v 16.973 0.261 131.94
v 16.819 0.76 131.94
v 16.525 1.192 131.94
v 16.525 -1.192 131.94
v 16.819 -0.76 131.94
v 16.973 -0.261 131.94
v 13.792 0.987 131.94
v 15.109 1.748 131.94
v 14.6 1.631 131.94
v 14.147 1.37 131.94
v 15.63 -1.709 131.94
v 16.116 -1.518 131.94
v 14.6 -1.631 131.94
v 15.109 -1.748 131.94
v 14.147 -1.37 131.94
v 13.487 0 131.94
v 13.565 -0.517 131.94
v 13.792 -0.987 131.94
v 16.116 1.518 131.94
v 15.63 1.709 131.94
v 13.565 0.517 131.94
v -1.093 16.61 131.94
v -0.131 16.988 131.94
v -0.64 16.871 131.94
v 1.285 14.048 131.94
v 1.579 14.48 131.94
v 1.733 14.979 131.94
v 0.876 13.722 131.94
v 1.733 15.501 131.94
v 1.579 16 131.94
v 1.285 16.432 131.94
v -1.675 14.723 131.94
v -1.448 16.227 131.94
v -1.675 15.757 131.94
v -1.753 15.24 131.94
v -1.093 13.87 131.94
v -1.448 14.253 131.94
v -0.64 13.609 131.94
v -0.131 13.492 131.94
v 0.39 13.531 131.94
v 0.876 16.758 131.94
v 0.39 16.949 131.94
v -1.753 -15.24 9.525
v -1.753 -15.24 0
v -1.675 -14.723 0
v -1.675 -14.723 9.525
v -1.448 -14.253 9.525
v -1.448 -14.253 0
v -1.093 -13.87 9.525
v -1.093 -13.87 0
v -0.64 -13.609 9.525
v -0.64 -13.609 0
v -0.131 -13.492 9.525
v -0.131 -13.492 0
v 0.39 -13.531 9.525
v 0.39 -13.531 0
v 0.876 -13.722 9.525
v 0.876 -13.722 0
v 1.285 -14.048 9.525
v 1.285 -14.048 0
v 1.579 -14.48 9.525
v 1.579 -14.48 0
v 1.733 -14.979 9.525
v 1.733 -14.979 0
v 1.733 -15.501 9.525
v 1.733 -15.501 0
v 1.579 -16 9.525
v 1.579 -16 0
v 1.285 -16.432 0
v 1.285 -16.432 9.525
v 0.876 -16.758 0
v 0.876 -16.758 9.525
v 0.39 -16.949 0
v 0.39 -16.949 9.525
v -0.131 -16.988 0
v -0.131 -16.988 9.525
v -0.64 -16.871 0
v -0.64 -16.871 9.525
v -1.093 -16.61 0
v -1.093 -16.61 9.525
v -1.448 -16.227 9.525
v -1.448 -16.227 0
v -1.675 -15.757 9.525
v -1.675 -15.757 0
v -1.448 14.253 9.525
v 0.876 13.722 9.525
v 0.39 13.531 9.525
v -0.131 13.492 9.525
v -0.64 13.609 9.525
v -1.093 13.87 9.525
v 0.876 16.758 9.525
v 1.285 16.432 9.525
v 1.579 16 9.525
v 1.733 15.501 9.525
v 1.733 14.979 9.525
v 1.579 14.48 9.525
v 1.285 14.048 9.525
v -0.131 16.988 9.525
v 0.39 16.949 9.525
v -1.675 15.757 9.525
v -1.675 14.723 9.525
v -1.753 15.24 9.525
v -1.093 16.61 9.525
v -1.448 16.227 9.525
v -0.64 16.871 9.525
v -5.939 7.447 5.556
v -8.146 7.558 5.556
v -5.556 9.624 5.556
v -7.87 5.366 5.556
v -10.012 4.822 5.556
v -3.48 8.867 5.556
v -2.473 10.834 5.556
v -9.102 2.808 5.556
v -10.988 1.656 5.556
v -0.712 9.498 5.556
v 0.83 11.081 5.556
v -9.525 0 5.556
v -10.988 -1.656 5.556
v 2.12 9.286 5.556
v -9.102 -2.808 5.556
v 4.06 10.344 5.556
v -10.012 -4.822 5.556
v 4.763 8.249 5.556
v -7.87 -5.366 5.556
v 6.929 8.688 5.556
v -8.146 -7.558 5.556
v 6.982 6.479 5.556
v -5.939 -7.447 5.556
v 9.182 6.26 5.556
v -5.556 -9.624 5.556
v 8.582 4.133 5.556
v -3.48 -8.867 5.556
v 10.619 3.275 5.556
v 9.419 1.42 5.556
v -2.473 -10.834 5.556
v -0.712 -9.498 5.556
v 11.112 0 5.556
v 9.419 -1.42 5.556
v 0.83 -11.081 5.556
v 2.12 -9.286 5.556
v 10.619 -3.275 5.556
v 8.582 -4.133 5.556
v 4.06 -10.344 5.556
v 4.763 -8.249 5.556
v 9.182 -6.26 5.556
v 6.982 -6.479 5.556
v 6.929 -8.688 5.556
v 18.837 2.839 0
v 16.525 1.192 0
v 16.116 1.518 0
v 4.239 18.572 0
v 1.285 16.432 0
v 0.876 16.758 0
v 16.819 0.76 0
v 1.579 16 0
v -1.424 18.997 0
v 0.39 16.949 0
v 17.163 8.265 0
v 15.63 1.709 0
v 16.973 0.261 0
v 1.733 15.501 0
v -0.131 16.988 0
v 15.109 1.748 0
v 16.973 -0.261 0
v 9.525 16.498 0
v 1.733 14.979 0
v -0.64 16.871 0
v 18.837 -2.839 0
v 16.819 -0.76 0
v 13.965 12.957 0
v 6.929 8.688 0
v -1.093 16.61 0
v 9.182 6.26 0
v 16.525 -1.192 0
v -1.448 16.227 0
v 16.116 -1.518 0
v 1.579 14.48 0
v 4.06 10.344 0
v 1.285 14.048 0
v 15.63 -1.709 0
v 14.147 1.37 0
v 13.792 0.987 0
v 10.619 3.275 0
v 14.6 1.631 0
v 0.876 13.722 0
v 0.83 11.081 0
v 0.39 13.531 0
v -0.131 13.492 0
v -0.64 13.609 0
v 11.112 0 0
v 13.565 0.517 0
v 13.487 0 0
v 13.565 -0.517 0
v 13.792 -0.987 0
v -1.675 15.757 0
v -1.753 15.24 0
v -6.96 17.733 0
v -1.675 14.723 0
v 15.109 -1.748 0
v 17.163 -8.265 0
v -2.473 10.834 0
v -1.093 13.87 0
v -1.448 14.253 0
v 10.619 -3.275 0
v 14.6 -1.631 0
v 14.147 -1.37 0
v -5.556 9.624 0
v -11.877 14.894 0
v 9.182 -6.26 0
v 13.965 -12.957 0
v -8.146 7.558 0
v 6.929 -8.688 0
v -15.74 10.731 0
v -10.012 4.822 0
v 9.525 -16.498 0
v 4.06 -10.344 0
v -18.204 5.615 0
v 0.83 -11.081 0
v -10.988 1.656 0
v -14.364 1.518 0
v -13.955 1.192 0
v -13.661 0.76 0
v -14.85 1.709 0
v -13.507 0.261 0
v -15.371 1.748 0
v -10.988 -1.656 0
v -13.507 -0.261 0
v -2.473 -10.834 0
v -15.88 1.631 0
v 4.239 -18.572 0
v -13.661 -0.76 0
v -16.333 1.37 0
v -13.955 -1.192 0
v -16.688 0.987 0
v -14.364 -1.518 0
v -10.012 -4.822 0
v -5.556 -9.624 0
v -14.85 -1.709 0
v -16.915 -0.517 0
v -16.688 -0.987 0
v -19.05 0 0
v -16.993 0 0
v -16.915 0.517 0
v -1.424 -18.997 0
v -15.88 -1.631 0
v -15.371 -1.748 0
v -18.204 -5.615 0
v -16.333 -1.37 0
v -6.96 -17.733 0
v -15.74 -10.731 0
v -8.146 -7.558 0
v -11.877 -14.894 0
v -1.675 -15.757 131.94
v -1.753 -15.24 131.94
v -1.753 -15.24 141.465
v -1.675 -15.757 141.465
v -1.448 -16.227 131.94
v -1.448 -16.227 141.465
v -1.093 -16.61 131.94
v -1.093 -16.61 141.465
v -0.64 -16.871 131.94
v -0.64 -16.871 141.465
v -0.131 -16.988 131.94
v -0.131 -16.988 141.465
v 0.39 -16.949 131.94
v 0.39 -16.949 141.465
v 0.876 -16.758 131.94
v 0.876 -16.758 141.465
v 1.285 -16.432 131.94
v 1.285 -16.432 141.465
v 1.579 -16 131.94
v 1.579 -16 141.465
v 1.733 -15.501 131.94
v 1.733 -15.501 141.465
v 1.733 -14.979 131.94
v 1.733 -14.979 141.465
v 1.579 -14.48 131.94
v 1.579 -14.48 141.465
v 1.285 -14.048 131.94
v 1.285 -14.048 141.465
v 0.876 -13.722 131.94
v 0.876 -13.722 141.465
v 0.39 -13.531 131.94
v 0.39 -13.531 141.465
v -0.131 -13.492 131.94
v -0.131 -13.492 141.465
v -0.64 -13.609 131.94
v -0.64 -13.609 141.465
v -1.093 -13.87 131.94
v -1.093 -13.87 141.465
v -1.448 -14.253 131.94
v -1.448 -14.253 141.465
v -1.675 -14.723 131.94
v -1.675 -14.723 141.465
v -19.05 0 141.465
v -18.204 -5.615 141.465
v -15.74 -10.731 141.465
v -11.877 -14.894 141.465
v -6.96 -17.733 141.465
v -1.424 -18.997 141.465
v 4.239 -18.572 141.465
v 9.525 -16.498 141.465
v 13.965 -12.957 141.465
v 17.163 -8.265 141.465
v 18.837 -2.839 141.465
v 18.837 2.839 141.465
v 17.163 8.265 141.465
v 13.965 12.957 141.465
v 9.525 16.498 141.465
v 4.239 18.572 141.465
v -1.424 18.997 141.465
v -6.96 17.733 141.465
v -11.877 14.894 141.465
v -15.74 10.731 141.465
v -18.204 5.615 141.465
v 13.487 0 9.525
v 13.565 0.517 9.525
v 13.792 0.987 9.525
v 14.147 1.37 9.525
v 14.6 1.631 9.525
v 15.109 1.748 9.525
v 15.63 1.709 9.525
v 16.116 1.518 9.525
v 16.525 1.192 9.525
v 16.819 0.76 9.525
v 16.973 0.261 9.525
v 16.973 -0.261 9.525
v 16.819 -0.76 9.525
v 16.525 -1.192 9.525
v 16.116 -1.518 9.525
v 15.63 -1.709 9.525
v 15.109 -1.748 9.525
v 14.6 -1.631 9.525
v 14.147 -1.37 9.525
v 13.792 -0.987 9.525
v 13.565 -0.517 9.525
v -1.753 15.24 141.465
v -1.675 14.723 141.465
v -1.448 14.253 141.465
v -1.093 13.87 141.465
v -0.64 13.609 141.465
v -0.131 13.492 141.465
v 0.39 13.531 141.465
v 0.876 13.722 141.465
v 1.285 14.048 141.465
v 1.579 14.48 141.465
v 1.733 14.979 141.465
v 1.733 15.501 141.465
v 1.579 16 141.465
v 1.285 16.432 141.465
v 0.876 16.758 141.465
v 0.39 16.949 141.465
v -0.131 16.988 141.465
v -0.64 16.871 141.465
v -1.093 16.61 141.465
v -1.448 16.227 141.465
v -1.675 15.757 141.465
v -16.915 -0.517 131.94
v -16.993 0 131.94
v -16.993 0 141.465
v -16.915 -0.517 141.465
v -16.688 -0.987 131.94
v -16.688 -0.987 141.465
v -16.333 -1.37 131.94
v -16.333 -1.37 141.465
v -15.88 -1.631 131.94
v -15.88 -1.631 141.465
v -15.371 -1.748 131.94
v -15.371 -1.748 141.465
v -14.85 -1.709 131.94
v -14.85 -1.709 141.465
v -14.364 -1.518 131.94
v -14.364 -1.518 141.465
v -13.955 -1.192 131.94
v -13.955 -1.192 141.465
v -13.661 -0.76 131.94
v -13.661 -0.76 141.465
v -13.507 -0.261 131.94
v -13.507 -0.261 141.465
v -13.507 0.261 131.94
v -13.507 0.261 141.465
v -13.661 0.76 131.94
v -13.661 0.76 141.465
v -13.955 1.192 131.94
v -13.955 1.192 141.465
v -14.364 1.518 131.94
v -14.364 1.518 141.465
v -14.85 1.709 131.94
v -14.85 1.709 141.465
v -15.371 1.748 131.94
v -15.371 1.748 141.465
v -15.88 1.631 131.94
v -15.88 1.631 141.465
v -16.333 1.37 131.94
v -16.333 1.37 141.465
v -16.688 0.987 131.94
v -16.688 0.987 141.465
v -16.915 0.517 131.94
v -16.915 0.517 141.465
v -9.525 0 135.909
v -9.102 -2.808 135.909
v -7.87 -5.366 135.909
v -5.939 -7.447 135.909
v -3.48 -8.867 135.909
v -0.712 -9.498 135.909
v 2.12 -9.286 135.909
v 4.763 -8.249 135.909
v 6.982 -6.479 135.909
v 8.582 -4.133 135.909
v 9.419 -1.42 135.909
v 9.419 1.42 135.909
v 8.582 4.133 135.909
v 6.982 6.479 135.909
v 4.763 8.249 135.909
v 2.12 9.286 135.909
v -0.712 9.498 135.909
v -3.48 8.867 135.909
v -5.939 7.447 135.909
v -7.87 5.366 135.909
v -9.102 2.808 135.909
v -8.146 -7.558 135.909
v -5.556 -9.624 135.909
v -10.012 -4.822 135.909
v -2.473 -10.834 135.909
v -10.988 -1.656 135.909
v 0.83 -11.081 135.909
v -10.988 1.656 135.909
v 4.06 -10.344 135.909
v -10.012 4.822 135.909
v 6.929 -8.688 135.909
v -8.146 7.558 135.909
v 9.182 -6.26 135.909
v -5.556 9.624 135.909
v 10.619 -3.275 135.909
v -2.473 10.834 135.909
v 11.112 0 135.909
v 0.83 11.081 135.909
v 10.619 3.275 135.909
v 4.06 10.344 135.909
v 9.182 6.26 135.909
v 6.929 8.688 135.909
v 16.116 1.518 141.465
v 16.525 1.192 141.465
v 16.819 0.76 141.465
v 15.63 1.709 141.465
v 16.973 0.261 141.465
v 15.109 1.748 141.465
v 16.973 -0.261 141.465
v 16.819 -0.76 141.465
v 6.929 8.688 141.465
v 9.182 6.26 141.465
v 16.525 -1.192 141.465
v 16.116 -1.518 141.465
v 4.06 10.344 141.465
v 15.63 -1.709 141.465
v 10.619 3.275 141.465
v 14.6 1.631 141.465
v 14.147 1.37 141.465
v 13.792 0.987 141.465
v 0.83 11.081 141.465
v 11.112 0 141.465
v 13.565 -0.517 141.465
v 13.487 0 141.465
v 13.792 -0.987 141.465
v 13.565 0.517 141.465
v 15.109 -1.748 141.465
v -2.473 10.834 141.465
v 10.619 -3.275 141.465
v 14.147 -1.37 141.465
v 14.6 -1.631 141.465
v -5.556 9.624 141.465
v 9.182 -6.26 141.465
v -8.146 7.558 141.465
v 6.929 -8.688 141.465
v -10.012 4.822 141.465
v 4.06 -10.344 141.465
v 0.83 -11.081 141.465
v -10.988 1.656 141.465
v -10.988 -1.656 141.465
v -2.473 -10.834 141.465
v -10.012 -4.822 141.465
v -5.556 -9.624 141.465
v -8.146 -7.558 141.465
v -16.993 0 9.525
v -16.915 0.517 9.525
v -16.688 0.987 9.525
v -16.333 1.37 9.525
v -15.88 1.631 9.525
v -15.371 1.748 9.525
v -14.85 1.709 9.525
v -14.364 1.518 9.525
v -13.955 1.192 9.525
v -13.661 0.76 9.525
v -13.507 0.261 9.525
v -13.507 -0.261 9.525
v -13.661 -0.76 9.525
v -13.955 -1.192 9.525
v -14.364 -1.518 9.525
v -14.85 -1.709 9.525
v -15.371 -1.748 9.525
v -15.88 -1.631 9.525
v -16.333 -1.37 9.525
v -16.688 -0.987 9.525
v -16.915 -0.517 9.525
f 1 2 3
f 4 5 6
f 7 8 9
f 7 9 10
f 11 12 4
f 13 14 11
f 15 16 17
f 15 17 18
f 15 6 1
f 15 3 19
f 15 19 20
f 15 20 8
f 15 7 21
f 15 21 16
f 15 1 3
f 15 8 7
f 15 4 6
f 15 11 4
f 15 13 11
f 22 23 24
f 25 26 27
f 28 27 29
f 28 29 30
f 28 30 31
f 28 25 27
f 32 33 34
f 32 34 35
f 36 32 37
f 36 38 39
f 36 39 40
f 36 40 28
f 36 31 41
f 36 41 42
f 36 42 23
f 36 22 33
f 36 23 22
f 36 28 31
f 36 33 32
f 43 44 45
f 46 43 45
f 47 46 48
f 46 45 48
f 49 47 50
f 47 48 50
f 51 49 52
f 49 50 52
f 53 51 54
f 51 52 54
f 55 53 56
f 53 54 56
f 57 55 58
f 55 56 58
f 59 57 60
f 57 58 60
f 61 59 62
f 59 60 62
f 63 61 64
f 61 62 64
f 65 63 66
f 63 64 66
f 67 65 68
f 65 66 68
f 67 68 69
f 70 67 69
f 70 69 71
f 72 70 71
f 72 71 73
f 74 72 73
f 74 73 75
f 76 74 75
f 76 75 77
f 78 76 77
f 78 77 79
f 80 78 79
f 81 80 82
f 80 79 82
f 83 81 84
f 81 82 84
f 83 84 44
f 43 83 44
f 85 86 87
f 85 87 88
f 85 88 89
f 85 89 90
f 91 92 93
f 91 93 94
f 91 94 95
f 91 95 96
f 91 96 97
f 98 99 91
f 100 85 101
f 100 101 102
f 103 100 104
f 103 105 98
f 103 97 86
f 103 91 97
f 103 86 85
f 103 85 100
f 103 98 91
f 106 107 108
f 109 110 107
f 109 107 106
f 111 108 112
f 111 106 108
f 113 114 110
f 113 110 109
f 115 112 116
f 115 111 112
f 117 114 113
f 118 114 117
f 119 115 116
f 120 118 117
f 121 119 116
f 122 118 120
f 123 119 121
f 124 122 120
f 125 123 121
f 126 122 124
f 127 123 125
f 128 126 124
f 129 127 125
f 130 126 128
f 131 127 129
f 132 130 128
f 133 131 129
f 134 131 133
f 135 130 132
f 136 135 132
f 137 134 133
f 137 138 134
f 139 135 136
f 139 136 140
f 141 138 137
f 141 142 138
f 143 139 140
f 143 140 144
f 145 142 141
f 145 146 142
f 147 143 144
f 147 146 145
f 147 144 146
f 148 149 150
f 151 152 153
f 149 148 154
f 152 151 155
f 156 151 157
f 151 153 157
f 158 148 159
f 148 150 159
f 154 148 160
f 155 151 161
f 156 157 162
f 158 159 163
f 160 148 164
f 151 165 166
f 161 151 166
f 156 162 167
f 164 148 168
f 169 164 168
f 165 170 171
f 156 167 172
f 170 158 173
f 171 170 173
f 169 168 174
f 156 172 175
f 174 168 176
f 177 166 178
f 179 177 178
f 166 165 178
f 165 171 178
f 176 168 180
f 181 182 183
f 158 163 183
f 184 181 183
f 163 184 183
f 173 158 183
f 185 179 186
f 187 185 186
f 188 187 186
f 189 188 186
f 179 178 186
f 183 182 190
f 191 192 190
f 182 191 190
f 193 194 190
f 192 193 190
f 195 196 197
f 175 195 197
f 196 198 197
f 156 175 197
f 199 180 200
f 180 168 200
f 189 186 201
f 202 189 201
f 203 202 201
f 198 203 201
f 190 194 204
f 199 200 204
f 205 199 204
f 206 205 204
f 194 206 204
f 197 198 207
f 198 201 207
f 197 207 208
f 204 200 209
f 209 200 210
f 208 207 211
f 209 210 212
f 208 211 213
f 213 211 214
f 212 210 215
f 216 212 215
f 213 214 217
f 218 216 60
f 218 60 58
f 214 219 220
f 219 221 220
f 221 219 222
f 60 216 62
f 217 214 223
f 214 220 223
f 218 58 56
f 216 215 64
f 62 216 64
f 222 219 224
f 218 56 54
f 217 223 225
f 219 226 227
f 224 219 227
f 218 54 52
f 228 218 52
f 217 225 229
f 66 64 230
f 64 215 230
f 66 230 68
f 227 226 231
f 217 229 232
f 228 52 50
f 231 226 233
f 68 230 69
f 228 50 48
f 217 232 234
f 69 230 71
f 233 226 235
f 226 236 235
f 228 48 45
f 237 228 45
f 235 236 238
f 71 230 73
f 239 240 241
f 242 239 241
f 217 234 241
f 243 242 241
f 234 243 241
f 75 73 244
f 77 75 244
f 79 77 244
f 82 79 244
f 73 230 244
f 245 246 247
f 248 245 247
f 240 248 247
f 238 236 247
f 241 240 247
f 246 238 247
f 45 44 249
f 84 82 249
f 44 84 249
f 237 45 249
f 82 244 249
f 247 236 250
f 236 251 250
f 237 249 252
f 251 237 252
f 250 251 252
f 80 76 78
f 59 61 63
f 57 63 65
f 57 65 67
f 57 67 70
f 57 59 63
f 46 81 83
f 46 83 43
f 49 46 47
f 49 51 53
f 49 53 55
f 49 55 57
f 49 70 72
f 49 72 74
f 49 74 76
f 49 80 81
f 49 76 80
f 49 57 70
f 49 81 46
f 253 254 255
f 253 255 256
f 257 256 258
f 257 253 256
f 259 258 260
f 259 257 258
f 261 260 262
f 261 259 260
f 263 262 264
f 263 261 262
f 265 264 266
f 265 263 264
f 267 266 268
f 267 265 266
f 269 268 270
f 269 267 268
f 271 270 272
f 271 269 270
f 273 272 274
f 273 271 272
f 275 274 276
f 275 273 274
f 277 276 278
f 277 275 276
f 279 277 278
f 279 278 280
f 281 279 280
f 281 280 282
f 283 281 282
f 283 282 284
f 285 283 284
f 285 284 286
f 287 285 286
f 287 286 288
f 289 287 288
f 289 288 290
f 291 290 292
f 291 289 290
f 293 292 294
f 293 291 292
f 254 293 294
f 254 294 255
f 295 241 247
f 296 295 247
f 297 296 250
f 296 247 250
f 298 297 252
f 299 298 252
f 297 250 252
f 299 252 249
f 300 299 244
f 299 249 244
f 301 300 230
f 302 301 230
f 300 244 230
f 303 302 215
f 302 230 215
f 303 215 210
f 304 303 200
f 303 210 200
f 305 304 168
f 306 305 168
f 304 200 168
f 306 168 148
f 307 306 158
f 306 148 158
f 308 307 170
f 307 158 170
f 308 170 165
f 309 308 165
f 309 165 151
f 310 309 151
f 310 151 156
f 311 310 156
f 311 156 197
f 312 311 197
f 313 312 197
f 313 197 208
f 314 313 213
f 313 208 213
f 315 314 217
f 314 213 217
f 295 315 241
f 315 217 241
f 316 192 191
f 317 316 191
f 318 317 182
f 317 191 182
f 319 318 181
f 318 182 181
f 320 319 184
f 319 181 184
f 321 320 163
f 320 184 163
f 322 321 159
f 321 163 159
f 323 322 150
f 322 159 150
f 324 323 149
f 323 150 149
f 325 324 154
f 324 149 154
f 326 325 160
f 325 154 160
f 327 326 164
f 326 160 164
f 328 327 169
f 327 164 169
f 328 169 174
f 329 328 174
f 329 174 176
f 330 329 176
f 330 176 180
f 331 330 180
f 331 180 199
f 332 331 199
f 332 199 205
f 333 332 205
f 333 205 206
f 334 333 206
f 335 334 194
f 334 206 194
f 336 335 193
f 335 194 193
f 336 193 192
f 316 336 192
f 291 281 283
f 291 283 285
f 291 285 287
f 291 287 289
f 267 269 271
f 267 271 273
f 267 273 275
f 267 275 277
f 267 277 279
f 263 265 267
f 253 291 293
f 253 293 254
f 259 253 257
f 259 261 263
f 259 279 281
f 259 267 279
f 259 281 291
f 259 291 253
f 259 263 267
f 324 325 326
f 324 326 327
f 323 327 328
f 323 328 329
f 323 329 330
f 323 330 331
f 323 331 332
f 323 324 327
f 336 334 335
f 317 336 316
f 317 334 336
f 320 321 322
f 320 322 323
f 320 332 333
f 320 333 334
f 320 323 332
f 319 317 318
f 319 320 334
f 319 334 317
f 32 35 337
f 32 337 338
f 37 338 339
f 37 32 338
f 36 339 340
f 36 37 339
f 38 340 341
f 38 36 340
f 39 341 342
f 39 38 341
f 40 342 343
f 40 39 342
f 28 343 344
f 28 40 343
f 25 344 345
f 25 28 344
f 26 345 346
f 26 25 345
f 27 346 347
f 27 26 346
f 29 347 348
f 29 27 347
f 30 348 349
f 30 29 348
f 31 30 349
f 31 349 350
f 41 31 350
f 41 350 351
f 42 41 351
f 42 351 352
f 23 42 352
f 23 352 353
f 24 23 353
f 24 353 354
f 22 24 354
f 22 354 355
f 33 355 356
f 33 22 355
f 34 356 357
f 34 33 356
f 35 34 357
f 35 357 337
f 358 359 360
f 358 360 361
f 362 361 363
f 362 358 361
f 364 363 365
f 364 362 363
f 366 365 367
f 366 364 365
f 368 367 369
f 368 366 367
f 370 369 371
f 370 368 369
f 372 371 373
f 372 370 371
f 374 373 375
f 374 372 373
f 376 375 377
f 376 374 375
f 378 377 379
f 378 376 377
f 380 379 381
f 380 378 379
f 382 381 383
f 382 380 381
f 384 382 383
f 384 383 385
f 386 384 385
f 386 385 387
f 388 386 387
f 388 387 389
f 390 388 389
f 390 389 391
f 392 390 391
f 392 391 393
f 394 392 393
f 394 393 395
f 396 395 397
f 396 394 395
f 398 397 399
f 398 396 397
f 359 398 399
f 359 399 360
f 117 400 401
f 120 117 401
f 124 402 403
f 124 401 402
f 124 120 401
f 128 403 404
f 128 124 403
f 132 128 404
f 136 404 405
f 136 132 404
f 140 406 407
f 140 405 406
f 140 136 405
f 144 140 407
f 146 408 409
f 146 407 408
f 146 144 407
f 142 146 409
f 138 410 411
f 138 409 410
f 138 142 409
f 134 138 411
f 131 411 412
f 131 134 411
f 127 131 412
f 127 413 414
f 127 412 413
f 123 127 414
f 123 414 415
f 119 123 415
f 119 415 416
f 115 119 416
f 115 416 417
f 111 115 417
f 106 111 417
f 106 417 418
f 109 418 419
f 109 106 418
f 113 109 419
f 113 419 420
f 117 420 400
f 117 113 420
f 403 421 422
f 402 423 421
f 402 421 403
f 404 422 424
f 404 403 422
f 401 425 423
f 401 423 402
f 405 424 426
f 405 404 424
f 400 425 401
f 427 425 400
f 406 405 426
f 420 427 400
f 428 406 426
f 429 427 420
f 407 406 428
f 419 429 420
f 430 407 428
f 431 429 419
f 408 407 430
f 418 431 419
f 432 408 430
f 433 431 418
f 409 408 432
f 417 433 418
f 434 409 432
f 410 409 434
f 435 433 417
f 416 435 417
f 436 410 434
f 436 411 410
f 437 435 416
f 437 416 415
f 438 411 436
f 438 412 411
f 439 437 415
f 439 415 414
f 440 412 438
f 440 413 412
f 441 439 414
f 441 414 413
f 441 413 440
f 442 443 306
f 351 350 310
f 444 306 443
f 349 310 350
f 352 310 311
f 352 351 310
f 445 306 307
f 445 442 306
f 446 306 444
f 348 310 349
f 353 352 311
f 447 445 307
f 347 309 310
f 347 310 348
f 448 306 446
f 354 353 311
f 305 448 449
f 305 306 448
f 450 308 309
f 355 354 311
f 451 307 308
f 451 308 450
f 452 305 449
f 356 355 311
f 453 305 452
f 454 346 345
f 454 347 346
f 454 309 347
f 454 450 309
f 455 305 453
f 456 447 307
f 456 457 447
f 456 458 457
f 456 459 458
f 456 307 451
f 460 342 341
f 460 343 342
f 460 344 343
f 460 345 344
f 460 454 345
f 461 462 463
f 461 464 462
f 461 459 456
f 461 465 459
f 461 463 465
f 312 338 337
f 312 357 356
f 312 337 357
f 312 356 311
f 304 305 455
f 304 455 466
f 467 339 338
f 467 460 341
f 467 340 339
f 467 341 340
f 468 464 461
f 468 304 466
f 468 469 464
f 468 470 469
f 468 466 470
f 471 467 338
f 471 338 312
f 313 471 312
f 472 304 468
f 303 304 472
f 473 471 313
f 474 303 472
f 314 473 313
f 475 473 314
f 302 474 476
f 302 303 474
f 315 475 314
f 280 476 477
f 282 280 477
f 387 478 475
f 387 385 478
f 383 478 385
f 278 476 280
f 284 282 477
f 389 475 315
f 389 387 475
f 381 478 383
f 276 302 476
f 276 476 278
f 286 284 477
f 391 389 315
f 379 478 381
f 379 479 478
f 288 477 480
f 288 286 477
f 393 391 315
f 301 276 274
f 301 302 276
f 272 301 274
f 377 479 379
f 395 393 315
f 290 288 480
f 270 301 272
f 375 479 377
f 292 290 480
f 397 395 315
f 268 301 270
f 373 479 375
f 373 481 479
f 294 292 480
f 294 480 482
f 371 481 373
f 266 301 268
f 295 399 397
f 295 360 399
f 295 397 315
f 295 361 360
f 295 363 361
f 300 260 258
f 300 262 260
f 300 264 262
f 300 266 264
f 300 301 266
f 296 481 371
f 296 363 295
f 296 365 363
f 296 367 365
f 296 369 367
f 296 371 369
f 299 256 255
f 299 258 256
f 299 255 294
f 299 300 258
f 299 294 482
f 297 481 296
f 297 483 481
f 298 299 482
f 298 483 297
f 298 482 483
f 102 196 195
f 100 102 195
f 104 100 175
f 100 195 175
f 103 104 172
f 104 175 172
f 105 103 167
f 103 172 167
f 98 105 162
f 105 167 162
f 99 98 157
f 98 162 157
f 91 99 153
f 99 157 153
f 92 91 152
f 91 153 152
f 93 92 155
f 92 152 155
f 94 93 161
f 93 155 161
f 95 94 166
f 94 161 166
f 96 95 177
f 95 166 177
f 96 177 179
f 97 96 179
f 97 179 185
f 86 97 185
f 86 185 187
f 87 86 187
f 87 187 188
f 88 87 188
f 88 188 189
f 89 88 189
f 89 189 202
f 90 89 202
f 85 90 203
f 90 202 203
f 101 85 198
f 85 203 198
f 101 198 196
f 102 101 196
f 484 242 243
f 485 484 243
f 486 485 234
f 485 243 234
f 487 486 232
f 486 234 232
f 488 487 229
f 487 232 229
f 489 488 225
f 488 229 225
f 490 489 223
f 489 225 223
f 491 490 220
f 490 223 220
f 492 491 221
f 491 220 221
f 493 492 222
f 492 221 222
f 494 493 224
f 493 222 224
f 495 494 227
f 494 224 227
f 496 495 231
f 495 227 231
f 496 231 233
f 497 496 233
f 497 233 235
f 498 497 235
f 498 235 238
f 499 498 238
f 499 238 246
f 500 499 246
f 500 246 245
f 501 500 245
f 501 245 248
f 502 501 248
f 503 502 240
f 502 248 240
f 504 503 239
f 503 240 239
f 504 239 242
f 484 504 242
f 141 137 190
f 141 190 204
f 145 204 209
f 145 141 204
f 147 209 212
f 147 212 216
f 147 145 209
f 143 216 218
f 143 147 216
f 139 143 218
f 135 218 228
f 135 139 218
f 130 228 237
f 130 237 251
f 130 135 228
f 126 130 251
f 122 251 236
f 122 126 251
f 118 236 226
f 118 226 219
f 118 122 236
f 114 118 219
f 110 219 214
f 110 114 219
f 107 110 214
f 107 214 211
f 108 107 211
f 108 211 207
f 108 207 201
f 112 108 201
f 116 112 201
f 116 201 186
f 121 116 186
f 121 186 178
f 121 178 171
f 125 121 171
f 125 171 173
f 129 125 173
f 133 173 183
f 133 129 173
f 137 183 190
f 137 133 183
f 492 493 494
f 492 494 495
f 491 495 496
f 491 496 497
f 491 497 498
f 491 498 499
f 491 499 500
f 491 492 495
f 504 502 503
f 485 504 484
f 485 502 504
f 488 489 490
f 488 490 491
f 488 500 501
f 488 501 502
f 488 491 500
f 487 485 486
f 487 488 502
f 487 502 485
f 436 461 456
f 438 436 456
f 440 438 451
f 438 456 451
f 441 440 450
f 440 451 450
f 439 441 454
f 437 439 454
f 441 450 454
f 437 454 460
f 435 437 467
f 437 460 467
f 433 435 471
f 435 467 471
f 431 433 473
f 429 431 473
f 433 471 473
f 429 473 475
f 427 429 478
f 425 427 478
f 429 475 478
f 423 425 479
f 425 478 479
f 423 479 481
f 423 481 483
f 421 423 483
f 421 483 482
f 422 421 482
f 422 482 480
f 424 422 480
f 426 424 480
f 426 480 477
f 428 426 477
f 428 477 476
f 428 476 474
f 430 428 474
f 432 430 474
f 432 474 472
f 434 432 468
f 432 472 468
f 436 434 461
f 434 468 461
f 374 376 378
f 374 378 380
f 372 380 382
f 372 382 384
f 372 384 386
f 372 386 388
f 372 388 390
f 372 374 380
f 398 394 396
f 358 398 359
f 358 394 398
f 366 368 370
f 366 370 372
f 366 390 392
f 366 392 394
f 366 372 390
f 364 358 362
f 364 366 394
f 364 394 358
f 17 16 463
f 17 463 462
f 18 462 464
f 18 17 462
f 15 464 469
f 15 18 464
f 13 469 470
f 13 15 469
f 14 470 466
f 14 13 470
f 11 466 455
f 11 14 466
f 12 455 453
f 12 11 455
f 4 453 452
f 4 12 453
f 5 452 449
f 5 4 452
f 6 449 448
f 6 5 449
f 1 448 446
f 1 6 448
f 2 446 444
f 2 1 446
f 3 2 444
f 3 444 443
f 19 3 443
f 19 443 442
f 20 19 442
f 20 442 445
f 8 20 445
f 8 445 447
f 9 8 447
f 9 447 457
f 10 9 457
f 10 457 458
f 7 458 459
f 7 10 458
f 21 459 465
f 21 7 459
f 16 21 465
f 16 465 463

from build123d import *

# Parameters (mm, degrees)
SKETCH1_R           = 19.05
SKETCH1_R_2         = 9.525
BOSS_EXTRUDE1_DEPTH = 141.4653
SKETCH2_R           = 1.7526
CUT_EXTRUDE1_DEPTH  = 9.525
CUT_EXTRUDE2_START  = -9.525
SKETCH3_R           = 1.7526
CUT_EXTRUDE2_DEPTH  = 9.525
SKETCH6_R           = 11.1125
CUT_EXTRUDE3_DEPTH  = 5.55625
CUT_EXTRUDE4_START  = -5.55625
SKETCH7_R           = 11.1125
CUT_EXTRUDE4_DEPTH  = 5.55625


with BuildPart() as part:
    # Sketch1 → Boss-Extrude1 (new body)
    with BuildSketch(Plane.XY):
        with Locations(Location((0, 0, 0), (0, 0, 180))):
            Circle(SKETCH1_R)
        with Locations(Location((0, 0, 0), (0, 0, 180))):
            Circle(SKETCH1_R_2, mode=Mode.SUBTRACT)
    extrude(amount=BOSS_EXTRUDE1_DEPTH)

    # Sketch2 → Cut-Extrude1 (cut)
    with BuildSketch(Plane(origin=(0, 0, 0), x_dir=(-1, 0, 0), z_dir=(0, 0, -1))):
        with Locations((0, 15.24)):
            Circle(SKETCH2_R)
        with Locations((15.24, 0)):
            Circle(SKETCH2_R)
        with Locations((0, -15.24)):
            Circle(SKETCH2_R)
        with Locations((-15.24, 0)):
            Circle(SKETCH2_R)
    extrude(amount=-CUT_EXTRUDE1_DEPTH, mode=Mode.SUBTRACT)

    # Sketch3 → Cut-Extrude2 (cut)
    with BuildSketch(Plane.XY.offset(141.4653).offset(CUT_EXTRUDE2_START)):
        with Locations(Location((0, 15.24, 0), (0, 0, 180))):
            Circle(SKETCH3_R)
        with Locations(Location((15.24, 0, 0), (0, 0, 180))):
            Circle(SKETCH3_R)
        with Locations(Location((0, -15.24, 0), (0, 0, 180))):
            Circle(SKETCH3_R)
        with Locations(Location((-15.24, 0, 0), (0, 0, 180))):
            Circle(SKETCH3_R)
    extrude(amount=CUT_EXTRUDE2_DEPTH, mode=Mode.SUBTRACT)

    # Sketch6 → Cut-Extrude3 (cut)
    with BuildSketch(Plane.XY.offset(141.4653)):
        Circle(SKETCH6_R)
    extrude(amount=-CUT_EXTRUDE3_DEPTH, mode=Mode.SUBTRACT)

    # Sketch7 → Cut-Extrude4 (cut)
    with BuildSketch(Plane(origin=(0, 0, 0), x_dir=(-1, 0, 0), z_dir=(0, 0, -1)).offset(CUT_EXTRUDE4_START)):
        with Locations(Location((0, 0, 0), (0, 0, 180))):
            Circle(SKETCH7_R)
    extrude(amount=CUT_EXTRUDE4_DEPTH, mode=Mode.SUBTRACT)


solid = part.part
